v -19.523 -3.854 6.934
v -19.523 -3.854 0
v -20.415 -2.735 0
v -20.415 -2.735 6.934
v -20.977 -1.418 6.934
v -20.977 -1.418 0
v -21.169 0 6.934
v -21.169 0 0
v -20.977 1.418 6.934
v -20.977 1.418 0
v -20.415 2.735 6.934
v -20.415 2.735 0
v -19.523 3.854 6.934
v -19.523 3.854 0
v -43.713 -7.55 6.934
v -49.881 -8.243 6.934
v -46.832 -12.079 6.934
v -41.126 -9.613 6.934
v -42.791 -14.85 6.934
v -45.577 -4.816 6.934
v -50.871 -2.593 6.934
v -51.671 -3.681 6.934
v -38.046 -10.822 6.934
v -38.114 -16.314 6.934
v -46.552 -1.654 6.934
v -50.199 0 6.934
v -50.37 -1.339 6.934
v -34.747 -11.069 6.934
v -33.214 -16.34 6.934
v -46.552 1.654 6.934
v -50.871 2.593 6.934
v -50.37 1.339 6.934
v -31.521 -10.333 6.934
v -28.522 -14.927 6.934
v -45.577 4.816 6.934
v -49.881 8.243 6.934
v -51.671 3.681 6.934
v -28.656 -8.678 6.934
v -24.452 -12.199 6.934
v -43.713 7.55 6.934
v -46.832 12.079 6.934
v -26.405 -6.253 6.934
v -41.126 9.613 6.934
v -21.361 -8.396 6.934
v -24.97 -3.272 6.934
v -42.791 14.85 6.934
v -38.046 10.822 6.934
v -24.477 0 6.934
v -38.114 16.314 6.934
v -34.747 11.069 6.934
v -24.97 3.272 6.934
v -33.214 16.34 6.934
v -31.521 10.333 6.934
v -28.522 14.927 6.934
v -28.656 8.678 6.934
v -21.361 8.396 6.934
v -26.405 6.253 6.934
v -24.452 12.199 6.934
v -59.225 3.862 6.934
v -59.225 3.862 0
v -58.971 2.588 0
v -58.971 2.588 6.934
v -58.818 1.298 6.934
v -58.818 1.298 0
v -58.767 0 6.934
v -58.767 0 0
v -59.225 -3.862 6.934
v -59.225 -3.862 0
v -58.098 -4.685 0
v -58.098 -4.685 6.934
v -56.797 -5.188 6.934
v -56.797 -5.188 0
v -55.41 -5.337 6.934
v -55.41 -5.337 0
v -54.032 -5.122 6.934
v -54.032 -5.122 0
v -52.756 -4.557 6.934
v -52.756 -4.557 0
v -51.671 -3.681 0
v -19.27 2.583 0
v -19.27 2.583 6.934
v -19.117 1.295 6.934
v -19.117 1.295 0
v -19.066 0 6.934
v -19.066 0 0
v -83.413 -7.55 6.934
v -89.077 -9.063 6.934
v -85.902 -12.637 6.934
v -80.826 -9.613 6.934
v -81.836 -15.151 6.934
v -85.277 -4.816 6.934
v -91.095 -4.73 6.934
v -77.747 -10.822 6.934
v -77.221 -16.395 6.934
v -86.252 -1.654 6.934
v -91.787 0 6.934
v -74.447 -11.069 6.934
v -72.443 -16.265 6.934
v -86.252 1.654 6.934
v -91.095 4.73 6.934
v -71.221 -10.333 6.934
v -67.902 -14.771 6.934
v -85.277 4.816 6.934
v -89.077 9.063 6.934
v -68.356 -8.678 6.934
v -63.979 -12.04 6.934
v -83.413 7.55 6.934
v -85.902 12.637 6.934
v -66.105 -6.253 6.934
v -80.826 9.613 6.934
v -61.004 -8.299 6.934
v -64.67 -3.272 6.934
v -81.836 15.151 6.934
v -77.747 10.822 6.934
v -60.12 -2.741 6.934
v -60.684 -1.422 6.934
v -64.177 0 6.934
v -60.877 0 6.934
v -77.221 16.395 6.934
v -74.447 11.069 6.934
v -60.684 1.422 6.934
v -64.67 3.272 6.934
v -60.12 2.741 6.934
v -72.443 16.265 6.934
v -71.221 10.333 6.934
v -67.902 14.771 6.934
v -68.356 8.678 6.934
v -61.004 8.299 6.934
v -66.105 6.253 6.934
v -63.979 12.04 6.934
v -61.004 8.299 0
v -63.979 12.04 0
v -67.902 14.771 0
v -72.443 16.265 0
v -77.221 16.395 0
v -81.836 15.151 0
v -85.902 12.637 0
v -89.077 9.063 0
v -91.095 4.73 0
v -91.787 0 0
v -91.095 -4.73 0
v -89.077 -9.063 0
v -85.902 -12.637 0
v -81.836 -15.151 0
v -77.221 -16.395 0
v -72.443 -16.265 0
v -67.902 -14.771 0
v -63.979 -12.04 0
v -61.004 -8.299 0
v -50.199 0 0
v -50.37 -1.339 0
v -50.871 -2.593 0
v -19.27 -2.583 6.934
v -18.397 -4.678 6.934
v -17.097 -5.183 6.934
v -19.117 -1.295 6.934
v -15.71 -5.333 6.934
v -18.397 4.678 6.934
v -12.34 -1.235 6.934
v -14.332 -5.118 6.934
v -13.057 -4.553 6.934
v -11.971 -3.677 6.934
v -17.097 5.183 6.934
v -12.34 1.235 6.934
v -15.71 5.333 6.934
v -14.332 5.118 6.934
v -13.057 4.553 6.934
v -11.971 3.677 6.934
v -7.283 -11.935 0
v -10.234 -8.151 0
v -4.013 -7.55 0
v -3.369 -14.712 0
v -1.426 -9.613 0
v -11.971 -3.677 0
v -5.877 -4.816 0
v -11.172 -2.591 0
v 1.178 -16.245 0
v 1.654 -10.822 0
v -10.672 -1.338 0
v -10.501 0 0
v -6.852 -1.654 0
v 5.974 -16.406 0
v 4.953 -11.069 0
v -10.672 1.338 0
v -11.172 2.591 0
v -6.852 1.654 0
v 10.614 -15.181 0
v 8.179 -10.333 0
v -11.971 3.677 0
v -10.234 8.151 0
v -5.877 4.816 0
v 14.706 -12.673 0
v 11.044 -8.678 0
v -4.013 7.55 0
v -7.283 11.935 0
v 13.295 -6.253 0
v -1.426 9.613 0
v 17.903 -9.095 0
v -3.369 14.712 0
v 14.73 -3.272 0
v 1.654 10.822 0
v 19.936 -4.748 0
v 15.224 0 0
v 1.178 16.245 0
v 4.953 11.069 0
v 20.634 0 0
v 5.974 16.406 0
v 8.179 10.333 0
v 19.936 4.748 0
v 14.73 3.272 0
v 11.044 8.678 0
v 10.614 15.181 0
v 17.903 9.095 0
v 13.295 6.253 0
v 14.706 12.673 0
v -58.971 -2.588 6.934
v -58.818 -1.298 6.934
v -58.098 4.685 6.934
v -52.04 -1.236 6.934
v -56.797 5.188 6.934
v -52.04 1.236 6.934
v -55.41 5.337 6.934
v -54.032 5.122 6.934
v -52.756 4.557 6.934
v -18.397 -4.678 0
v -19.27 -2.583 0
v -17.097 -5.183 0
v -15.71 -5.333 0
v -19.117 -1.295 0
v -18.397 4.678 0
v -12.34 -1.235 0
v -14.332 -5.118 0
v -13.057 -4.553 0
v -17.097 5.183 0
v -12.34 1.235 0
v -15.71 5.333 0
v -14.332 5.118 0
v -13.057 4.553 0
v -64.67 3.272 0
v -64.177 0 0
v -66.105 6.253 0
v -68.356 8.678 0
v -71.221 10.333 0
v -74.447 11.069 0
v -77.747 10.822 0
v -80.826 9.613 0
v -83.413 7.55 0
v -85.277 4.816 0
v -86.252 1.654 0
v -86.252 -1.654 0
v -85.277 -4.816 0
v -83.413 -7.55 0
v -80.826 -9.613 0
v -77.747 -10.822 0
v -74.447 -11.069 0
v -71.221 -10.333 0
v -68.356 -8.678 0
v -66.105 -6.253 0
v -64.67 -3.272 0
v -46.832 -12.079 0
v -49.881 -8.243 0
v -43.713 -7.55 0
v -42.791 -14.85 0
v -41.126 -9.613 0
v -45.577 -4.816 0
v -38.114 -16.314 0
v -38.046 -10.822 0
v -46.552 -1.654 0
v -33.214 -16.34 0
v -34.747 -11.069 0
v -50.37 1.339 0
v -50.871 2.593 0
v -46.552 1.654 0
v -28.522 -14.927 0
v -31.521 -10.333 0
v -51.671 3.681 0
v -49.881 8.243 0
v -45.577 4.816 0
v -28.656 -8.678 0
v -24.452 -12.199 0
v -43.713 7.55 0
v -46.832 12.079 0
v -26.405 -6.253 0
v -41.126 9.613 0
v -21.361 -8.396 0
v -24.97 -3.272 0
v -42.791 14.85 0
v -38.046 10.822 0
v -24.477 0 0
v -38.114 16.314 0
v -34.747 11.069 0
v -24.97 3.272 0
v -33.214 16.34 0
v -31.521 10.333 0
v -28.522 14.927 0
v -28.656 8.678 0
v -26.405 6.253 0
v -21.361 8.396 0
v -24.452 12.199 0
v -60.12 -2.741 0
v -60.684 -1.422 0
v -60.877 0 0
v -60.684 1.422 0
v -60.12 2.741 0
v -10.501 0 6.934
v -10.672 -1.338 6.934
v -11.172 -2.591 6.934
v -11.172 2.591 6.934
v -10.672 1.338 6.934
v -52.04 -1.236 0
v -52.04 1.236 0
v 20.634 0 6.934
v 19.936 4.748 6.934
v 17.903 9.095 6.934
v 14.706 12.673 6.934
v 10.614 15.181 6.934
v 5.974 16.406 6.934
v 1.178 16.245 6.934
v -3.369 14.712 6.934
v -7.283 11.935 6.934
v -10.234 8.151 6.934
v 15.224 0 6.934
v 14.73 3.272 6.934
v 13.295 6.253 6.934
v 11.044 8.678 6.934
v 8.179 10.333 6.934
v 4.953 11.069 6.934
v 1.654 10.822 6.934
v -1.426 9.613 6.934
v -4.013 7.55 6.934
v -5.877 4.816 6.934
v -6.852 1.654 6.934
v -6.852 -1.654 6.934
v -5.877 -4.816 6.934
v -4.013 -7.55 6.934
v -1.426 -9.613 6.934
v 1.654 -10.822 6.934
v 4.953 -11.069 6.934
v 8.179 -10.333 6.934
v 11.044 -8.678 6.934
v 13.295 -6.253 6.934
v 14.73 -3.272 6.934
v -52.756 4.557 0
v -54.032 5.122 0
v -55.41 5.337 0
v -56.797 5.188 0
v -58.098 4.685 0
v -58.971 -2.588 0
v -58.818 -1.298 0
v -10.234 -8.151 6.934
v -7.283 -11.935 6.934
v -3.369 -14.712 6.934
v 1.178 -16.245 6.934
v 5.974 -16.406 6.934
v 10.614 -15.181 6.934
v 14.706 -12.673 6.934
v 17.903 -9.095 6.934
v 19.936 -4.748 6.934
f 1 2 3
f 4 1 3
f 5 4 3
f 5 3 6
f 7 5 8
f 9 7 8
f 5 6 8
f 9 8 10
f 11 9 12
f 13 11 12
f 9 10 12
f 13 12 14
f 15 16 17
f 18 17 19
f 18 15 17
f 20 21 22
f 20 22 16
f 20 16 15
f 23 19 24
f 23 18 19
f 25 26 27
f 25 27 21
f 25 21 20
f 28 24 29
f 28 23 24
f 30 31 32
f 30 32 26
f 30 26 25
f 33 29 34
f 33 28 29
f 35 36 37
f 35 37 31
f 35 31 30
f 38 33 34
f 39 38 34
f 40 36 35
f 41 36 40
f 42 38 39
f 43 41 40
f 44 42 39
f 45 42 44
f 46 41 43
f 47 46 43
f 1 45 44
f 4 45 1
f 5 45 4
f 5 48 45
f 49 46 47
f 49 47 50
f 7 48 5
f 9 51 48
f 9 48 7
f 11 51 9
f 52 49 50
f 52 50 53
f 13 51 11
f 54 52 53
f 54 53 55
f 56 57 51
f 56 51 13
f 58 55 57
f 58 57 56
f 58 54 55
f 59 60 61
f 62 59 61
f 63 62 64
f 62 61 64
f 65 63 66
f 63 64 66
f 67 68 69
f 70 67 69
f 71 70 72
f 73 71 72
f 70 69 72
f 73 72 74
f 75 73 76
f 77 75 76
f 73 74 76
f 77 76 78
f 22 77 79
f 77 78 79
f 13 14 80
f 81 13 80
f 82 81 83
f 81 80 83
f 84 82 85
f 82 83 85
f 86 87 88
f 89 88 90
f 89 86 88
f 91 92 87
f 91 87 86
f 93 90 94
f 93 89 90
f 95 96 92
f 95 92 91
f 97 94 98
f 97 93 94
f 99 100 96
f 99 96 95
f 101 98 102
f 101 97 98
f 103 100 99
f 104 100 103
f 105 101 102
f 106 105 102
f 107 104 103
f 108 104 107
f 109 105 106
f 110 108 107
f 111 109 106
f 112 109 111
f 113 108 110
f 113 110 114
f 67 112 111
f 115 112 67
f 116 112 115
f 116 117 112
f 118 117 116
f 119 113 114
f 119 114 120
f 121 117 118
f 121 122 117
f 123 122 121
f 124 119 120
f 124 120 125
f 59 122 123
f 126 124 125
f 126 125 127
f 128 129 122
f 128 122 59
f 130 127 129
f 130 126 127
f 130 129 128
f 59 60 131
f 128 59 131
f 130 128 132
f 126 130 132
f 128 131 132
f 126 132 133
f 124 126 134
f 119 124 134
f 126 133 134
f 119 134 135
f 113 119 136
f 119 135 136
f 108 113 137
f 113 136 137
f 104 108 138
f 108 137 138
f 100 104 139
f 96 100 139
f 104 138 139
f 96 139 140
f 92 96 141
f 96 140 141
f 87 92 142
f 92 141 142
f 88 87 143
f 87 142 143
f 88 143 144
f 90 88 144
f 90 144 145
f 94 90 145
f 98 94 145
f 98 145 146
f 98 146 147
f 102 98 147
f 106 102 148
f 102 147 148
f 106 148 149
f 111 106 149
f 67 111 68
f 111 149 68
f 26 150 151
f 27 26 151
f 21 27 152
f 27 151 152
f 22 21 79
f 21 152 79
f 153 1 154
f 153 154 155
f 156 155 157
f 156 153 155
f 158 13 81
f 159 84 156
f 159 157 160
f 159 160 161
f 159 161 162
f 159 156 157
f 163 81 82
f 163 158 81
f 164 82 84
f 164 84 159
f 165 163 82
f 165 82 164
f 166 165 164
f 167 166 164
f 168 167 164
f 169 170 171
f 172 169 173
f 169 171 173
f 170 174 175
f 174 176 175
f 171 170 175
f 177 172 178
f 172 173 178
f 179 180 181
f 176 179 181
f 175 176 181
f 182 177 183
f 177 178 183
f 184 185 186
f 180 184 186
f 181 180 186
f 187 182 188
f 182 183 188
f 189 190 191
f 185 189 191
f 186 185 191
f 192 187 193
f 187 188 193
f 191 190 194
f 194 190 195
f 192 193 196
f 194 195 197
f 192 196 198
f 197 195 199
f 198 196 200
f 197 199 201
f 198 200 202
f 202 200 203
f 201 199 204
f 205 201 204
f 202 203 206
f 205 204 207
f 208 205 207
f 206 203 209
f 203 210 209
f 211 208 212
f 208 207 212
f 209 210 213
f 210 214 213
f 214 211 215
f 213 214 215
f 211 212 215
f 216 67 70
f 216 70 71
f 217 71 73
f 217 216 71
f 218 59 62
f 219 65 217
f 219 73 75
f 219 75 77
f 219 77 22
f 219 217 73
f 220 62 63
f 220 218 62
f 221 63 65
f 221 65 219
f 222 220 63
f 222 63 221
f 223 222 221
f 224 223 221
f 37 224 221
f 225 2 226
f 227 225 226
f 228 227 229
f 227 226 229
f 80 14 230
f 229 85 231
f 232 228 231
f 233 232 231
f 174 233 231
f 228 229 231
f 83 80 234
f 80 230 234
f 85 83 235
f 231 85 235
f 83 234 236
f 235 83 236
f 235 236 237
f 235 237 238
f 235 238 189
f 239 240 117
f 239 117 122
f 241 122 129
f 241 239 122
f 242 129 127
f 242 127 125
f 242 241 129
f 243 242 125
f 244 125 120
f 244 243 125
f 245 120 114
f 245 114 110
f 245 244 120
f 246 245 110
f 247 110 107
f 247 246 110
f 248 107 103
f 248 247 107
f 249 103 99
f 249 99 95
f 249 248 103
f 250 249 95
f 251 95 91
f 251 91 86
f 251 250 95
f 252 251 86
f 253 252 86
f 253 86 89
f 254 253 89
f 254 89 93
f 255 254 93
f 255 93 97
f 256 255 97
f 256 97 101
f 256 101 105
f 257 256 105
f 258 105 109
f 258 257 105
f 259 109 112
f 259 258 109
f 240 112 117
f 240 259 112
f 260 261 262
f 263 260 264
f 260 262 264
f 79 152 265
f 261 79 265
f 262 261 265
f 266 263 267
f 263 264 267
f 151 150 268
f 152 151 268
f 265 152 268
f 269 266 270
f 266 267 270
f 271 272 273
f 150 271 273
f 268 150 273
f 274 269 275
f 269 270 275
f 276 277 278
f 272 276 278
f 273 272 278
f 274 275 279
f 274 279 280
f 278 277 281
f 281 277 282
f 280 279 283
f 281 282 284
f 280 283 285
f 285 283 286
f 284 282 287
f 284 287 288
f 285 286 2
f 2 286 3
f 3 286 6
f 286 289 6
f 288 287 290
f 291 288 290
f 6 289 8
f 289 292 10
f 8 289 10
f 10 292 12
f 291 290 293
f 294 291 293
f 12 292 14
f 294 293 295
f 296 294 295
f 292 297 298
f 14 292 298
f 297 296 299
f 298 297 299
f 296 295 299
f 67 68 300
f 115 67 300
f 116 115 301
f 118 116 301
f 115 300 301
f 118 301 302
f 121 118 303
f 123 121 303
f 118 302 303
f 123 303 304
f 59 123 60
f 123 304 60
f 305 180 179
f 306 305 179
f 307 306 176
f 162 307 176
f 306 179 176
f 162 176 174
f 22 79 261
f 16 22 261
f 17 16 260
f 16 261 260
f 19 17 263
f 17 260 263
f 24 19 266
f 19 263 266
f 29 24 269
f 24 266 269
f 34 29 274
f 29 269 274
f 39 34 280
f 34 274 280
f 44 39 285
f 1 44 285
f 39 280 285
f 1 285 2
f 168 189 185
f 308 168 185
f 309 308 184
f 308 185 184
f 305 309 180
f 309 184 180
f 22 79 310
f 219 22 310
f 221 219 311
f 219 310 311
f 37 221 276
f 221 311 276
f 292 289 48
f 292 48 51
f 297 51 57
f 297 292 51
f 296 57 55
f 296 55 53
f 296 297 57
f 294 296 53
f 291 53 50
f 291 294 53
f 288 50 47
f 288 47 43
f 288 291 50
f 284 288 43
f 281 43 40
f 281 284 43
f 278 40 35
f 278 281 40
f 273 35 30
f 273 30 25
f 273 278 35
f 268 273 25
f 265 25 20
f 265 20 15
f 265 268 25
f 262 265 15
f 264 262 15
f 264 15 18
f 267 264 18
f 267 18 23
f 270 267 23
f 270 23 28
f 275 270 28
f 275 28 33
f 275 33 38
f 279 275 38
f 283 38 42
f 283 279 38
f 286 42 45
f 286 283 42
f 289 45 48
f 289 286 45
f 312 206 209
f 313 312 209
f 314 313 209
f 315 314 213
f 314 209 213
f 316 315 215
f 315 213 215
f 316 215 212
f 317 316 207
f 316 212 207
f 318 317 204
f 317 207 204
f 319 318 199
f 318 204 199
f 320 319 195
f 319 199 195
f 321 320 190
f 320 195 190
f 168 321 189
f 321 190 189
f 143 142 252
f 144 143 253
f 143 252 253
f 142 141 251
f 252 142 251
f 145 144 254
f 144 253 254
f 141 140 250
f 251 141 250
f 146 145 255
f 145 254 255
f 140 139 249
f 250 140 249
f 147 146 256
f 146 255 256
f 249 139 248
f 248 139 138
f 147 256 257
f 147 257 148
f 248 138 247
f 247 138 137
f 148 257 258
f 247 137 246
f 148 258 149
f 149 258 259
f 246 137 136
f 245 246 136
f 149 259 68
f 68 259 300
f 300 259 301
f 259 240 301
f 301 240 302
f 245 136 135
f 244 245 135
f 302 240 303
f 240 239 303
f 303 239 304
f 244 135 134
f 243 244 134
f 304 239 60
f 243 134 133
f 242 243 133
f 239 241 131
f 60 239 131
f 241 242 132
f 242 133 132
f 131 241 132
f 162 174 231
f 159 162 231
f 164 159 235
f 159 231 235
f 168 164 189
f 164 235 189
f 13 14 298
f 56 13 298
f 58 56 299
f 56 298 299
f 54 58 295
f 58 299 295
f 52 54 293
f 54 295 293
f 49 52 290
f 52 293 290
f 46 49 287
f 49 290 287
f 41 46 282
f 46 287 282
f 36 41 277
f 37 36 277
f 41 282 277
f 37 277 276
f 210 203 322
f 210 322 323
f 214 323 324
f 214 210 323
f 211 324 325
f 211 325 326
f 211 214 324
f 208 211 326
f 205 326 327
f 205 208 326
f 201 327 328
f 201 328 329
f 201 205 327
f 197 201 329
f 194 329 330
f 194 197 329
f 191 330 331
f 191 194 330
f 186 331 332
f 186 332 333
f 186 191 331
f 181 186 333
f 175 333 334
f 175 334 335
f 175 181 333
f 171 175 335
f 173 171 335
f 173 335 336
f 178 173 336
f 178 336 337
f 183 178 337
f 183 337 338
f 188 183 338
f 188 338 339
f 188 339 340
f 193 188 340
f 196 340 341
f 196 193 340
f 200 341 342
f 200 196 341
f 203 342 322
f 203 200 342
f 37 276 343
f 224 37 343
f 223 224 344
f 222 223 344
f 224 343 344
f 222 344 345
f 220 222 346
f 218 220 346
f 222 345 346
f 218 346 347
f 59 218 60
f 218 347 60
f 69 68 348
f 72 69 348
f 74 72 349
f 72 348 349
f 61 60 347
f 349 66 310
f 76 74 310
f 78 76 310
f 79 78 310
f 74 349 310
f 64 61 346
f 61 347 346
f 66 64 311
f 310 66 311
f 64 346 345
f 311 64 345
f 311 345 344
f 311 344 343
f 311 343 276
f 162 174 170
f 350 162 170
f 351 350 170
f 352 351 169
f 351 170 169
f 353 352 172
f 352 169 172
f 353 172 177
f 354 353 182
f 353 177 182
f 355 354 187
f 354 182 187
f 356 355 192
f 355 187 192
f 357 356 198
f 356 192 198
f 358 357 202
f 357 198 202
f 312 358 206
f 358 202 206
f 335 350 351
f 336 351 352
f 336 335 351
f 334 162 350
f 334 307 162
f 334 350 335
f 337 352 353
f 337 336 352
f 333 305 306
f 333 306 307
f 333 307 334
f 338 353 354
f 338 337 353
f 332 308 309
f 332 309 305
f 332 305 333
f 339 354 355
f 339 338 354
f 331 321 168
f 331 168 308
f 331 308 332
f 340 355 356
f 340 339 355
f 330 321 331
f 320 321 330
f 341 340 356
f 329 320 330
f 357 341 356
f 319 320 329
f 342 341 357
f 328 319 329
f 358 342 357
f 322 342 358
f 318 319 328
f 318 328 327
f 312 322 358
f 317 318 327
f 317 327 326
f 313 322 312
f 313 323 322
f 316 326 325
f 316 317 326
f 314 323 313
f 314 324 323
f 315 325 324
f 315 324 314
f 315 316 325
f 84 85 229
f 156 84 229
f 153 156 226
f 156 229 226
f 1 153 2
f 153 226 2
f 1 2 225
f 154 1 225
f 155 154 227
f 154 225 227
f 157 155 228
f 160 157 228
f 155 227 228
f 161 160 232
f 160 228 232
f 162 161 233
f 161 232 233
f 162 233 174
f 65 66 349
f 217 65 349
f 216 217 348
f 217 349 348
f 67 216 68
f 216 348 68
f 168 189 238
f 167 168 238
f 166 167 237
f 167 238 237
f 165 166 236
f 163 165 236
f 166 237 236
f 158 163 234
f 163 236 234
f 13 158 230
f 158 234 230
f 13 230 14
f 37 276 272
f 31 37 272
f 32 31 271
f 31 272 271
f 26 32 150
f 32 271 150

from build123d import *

# Parameters (mm, degrees)
F0_R     = 11.0998
F1_DEPTH = 6.9342


with BuildPart() as f1:
    # F0 (on Top) → F1 (new body)
    with BuildSketch(Plane.XY):
        with BuildLine():
            ThreePointArc((-59.2245934549, -3.8618282896), (-60.876980173, 0), (-59.2245934549, 3.8618282896))
            ThreePointArc((-59.2245934549, 3.8618282896), (-91.7865834332, 0), (-59.2245934549, -3.8618282896))
        make_face()
        with Locations((-75.2765834332, 0)):
            Circle(F0_R, mode=Mode.SUBTRACT)
    extrude(amount=F1_DEPTH)


with BuildPart() as f1b:
    # F0 (on Top) → F1, piece 2 (new body)
    with BuildSketch(Plane.XY):
        with BuildLine():
            ThreePointArc((-51.6708123922, -3.6809586365), (-52.0863834332, 0), (-51.6708123922, 3.6809586365))
            ThreePointArc((-51.6708123922, 3.6809586365), (-55.4102050064, 5.3374442142), (-59.2245934549, 3.8618282896))
            ThreePointArc((-59.2245934549, 3.8618282896), (-58.8814857735, 1.9444466384), (-58.7665834332, 0))
            ThreePointArc((-58.7665834332, 0), (-58.8814857735, -1.9444466384), (-59.2245934549, -3.8618282896))
            ThreePointArc((-59.2245934549, -3.8618282896), (-55.4102050064, -5.3374442142), (-51.6708123922, -3.6809586365))
        make_face()
    extrude(amount=F1_DEPTH)


with BuildPart() as f1c:
    # F0 (on Top) → F1, piece 3 (new body)
    with BuildSketch(Plane.XY):
        with BuildLine():
            ThreePointArc((-11.9714139963, -3.6774519874), (5.9742007705, -16.4059799555), (20.6338165668, 0))
            ThreePointArc((20.6338165668, 0), (5.9742007705, 16.4059799555), (-11.9714139963, 3.6774519874))
            ThreePointArc((-11.9714139963, 3.6774519874), (-10.882284166, 1.9802487083), (-10.5010784332, 0))
            ThreePointArc((-10.5010784332, 0), (-10.882284166, -1.9802487083), (-11.9714139963, -3.6774519874))
        make_face()
        with Locations((4.1238165668, 0)):
            Circle(F0_R, mode=Mode.SUBTRACT)
    extrude(amount=F1_DEPTH)


with BuildPart() as f1d:
    # F0 (on Top) → F1, piece 4 (new body)
    with BuildSketch(Plane.XY):
        with BuildLine():
            ThreePointArc((-19.5225392951, -3.8541131784), (-21.1690784332, 0), (-19.5225392951, 3.8541131784))
            ThreePointArc((-19.5225392951, 3.8541131784), (-35.6653070282, 16.509760525), (-51.6708123922, 3.6809586365))
            ThreePointArc((-51.6708123922, 3.6809586365), (-50.5806131201, 1.9821449095), (-50.1990320807, 0))
            ThreePointArc((-50.1990320807, 0), (-50.5806131201, -1.9821449095), (-51.6708123922, -3.6809586365))
            ThreePointArc((-51.6708123922, -3.6809586365), (-35.6653070282, -16.509760525), (-19.5225392951, -3.8541131784))
        make_face()
        with Locations((-35.5763834332, 0)):
            Circle(F0_R, mode=Mode.SUBTRACT)
    extrude(amount=F1_DEPTH)


with BuildPart() as f1e:
    # F0 (on Top) → F1, piece 5 (new body)
    with BuildSketch(Plane.XY):
        with BuildLine():
            ThreePointArc((-11.9714139963, -3.6774519874), (-12.3861834332, 0), (-11.9714139963, 3.6774519874))
            ThreePointArc((-11.9714139963, 3.6774519874), (-15.7103217938, 5.3325408373), (-19.5225392951, 3.8541131784))
            ThreePointArc((-19.5225392951, 3.8541131784), (-19.1808189915, 1.9405067999), (-19.0663834332, 0))
            ThreePointArc((-19.0663834332, 0), (-19.1808189915, -1.9405067999), (-19.5225392951, -3.8541131784))
            ThreePointArc((-19.5225392951, -3.8541131784), (-15.7103217938, -5.3325408373), (-11.9714139963, -3.6774519874))
        make_face()
    extrude(amount=F1_DEPTH)


solid = Compound([f1.part, f1b.part, f1c.part, f1d.part, f1e.part])
